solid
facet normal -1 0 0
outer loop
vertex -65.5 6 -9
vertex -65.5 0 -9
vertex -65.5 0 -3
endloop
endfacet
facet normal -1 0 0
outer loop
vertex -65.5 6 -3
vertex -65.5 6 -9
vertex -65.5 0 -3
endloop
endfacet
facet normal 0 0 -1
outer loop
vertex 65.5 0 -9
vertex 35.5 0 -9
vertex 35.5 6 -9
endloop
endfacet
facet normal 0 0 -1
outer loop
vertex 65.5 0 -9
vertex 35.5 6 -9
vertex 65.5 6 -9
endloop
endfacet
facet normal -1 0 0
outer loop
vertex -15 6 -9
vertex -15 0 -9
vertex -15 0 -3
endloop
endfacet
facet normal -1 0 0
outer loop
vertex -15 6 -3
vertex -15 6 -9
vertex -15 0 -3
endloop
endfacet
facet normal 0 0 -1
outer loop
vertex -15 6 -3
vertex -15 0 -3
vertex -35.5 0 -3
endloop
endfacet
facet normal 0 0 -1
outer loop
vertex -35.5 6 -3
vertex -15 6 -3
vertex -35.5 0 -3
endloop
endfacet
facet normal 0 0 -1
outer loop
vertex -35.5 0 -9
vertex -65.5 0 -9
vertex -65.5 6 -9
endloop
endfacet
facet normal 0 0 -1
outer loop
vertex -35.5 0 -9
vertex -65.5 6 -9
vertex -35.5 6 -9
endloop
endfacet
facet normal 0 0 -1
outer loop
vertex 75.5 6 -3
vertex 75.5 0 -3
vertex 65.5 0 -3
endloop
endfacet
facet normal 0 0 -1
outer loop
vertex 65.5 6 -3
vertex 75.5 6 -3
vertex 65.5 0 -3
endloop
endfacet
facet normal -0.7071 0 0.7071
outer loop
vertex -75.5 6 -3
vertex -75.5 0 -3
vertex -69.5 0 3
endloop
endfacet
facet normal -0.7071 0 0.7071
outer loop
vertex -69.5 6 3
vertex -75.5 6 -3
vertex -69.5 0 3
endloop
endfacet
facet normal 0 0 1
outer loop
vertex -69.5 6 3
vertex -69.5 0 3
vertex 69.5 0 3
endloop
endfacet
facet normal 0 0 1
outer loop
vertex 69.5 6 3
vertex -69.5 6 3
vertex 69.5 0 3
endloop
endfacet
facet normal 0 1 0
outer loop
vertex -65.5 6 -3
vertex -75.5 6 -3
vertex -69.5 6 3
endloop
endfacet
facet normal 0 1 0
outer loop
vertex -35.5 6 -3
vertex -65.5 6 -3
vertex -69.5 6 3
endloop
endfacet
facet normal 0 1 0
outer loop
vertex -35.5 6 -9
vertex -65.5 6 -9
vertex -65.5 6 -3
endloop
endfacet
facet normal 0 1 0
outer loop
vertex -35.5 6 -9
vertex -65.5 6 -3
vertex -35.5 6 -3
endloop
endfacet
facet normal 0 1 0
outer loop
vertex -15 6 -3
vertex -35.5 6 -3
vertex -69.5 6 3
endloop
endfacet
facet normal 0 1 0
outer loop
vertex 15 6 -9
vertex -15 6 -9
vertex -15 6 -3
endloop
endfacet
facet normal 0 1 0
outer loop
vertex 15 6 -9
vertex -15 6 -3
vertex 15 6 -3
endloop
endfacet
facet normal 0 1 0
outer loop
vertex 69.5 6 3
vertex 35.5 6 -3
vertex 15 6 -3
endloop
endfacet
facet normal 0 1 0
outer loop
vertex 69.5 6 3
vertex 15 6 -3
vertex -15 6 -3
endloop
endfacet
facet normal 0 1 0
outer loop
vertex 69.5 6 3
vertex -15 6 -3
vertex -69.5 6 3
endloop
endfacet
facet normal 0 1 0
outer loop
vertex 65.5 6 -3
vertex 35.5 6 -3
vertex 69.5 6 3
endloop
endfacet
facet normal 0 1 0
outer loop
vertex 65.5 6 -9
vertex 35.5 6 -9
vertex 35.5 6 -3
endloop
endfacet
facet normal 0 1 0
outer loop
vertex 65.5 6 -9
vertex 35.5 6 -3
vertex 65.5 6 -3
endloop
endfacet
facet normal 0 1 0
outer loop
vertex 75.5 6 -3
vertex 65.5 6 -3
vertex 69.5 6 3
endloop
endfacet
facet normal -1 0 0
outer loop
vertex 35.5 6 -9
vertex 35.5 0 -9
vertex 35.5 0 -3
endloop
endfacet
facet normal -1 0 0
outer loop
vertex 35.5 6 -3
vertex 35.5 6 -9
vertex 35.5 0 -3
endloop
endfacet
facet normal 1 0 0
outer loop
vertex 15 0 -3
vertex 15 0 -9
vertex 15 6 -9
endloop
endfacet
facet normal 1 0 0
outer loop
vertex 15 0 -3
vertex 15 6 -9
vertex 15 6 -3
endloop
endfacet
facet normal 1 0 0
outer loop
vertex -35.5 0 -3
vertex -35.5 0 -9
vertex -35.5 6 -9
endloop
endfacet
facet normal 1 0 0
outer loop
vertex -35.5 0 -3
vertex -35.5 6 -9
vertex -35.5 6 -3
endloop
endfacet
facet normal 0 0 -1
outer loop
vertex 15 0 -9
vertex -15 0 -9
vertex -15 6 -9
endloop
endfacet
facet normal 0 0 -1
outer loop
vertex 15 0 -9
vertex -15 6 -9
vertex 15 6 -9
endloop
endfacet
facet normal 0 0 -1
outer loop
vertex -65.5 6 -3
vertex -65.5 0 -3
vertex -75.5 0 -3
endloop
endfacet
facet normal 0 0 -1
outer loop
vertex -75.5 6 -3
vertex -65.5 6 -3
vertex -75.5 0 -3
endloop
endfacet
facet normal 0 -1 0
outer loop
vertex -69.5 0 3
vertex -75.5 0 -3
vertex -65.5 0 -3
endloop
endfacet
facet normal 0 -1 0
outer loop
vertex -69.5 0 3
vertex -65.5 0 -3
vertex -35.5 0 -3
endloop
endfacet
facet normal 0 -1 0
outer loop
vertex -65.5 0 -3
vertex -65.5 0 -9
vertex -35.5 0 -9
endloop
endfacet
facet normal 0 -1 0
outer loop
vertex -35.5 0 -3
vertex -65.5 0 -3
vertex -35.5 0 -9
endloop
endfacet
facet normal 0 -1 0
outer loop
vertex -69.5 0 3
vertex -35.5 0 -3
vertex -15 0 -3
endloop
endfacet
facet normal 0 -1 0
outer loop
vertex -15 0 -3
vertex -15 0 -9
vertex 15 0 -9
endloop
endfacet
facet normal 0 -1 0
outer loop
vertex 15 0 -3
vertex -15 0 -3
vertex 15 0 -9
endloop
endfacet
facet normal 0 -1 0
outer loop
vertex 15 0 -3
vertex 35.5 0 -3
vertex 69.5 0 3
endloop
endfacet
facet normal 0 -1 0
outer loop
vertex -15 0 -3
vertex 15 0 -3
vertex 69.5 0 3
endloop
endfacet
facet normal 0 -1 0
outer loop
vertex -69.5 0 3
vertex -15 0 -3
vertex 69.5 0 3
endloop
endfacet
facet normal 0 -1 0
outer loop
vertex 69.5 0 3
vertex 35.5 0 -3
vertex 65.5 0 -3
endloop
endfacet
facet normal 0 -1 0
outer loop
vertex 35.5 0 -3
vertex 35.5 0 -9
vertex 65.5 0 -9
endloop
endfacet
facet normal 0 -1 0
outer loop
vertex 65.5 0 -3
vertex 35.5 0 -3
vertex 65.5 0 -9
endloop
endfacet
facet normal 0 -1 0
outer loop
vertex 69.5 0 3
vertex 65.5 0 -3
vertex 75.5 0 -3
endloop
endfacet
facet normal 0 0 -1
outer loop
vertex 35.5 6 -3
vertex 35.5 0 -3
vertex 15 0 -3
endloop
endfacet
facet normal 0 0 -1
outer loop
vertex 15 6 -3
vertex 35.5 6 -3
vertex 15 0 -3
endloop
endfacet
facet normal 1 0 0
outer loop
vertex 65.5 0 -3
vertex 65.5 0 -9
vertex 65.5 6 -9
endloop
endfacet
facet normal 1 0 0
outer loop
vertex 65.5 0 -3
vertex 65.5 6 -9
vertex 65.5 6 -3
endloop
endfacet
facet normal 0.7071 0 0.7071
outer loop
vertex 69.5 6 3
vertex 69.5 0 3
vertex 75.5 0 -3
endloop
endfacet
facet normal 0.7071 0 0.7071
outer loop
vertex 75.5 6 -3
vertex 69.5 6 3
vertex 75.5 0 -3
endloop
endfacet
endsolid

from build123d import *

# Parameters (mm, degrees)
BOSS_EXTRUDE1_DEPTH = 6
SKETCH3_W           = 30
SKETCH3_H           = 6
BOSS_EXTRUDE2_DEPTH = 6


with BuildPart() as part:
    # Sketch1 → Boss-Extrude1 (new body)
    with BuildSketch(Plane(origin=(0, 0, 0), x_dir=(1, 0, 0), z_dir=(0, 1, 0))):
        Polygon((75.5, 3), (-75.5, 3), (-69.5, -3), (69.5, -3), align=None)
    extrude(amount=BOSS_EXTRUDE1_DEPTH)

    # Sketch3 → Boss-Extrude2 (add)
    with BuildSketch(Plane.XZ):
        with Locations((50.5, -6)):
            Rectangle(SKETCH3_W, SKETCH3_H)
        with Locations((0, -6)):
            Rectangle(SKETCH3_W, SKETCH3_H)
        with Locations((-50.5, -6)):
            Rectangle(SKETCH3_W, SKETCH3_H)
    extrude(amount=-BOSS_EXTRUDE2_DEPTH)


solid = part.part
